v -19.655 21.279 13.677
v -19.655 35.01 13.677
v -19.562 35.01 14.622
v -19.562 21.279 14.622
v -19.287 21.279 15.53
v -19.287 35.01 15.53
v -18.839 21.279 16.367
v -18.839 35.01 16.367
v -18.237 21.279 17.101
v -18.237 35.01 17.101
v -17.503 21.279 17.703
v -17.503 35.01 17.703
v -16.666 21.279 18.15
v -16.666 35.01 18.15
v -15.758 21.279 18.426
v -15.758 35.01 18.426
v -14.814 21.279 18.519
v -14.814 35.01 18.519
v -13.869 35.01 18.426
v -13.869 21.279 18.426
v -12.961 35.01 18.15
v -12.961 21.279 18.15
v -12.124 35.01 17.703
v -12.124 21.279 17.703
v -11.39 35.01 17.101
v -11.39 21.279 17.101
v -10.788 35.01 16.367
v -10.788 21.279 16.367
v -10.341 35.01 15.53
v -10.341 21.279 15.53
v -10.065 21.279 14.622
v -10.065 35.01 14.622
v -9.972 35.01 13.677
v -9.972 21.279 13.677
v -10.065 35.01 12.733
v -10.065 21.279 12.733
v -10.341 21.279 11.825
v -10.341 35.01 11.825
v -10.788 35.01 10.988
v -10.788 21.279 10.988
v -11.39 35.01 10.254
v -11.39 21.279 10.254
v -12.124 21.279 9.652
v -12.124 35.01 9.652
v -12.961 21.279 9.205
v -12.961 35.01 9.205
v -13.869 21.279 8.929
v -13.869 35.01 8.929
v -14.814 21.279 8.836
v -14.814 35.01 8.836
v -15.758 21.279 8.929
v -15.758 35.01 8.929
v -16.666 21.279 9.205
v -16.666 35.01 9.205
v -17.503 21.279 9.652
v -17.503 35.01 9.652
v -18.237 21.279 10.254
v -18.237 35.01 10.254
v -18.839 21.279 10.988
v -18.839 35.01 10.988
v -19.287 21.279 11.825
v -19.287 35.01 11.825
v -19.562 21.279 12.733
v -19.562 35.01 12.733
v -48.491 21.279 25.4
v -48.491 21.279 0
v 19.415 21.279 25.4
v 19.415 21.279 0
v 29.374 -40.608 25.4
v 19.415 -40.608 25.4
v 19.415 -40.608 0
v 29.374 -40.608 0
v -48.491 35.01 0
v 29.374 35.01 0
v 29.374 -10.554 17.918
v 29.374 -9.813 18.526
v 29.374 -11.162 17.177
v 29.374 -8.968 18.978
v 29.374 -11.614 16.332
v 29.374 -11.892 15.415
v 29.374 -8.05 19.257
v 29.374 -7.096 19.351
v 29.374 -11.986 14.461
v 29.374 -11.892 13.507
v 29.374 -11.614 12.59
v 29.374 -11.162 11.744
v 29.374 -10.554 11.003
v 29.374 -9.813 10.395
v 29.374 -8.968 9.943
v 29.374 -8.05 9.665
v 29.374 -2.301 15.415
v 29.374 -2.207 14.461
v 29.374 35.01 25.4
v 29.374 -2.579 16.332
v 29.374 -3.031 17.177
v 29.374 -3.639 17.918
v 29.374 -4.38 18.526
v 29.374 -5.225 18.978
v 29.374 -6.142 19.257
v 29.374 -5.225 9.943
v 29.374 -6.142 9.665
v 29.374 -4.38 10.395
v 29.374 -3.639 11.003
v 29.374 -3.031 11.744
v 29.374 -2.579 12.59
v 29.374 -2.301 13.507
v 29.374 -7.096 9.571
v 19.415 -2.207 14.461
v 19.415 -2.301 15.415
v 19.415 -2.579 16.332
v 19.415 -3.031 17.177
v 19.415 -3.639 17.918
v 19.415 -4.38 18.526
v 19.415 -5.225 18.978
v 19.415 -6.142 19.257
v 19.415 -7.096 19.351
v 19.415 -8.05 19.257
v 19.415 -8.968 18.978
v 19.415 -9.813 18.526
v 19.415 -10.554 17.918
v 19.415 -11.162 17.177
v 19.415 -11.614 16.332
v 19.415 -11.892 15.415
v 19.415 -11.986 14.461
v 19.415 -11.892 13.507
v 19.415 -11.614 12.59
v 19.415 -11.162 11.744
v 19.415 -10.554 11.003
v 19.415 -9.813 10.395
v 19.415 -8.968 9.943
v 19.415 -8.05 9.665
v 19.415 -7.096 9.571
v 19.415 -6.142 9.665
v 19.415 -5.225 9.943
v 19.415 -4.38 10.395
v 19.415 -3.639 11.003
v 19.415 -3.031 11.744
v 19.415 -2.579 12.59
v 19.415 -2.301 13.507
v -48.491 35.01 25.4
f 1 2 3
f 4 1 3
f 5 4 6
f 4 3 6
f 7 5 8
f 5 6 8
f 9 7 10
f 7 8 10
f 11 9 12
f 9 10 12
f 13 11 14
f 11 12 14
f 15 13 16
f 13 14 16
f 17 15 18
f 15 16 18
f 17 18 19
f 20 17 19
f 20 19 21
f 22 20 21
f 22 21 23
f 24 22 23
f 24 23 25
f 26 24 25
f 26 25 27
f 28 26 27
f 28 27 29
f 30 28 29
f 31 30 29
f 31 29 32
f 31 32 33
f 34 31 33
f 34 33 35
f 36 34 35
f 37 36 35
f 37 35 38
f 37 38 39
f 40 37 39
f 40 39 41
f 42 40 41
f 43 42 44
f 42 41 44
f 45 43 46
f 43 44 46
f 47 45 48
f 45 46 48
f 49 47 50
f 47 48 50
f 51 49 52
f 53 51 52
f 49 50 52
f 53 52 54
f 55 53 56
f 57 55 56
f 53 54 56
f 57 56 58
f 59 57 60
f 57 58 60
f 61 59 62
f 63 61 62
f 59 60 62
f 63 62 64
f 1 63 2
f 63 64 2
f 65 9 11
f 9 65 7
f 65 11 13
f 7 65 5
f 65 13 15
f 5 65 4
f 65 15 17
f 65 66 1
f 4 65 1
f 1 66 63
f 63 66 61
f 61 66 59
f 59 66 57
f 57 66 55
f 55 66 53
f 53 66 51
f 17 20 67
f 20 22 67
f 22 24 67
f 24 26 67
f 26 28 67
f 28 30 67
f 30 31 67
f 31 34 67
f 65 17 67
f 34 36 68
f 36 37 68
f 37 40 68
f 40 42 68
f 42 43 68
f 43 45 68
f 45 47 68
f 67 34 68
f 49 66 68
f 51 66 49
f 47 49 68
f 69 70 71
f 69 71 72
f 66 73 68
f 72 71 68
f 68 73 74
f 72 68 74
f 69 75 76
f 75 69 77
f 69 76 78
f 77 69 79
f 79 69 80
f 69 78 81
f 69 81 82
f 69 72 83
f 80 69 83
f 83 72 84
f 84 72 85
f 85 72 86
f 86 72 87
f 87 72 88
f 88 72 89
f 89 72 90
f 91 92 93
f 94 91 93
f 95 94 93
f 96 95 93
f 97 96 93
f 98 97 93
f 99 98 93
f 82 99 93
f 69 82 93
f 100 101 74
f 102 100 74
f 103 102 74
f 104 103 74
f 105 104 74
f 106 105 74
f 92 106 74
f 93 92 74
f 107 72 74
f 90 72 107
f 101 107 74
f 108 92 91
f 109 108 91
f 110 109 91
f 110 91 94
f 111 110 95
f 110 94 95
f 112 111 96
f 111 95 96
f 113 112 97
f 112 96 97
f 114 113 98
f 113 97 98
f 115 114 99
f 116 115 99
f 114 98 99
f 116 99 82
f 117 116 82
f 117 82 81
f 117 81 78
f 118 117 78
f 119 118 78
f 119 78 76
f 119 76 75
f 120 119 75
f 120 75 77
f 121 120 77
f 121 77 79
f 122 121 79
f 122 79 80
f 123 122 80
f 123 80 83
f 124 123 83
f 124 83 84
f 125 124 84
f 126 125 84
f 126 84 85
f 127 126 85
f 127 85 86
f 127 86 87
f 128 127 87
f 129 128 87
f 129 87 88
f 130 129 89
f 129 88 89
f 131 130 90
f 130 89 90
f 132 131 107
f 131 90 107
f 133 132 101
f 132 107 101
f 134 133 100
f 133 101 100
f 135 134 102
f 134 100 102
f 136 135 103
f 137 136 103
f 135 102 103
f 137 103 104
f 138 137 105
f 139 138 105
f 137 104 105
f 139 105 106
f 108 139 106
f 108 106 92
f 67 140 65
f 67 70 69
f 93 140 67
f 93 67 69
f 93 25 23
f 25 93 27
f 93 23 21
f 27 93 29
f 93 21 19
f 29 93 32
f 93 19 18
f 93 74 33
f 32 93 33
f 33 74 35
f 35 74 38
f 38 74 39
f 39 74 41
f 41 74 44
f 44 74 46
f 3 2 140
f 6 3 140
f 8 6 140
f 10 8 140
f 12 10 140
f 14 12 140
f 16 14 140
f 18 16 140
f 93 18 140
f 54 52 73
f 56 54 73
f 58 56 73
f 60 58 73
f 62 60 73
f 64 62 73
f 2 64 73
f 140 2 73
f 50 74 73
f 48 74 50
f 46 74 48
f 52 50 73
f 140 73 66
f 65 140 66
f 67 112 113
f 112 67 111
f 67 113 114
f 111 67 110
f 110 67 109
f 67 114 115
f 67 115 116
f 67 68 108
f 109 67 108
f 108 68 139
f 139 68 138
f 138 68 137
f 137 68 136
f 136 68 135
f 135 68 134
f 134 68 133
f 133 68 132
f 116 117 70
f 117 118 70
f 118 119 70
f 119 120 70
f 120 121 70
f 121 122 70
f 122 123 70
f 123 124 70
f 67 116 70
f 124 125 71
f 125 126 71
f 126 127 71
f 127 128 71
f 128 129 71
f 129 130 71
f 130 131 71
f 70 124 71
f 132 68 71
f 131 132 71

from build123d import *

# Parameters (mm, degrees)
F1_DEPTH = 25.4
F2_R     = 4.889775
F3_DEPTH = 25.4
F4_R     = 4.841352
F5_DEPTH = 14.478


with BuildPart() as f1:
    # F0 (on Top) → F1 (new body)
    with BuildSketch(Plane.XY):
        Polygon((29.374033, 35.010495), (-48.49131, 35.010495), (-48.49131, 21.278509), (19.415045, 21.278509), (19.415045, -40.607721), (29.374033, -40.607721), align=None)
    extrude(amount=F1_DEPTH)

    # F2 (on face) → F3 (cut)
    with BuildSketch(Plane.YZ.offset(29.374033)):
        with Locations((-7.096407, 14.460783)):
            Circle(F2_R)
    extrude(amount=-F3_DEPTH, mode=Mode.SUBTRACT)

    # F4 (on face) → F5 (cut)
    with BuildSketch(Plane(origin=(0, 35.010495, 0), x_dir=(-1, 0, 0), z_dir=(0, 1, 0))):
        with Locations((14.813676, 13.677494)):
            Circle(F4_R)
    extrude(amount=-F5_DEPTH, mode=Mode.SUBTRACT)


solid = f1.part
